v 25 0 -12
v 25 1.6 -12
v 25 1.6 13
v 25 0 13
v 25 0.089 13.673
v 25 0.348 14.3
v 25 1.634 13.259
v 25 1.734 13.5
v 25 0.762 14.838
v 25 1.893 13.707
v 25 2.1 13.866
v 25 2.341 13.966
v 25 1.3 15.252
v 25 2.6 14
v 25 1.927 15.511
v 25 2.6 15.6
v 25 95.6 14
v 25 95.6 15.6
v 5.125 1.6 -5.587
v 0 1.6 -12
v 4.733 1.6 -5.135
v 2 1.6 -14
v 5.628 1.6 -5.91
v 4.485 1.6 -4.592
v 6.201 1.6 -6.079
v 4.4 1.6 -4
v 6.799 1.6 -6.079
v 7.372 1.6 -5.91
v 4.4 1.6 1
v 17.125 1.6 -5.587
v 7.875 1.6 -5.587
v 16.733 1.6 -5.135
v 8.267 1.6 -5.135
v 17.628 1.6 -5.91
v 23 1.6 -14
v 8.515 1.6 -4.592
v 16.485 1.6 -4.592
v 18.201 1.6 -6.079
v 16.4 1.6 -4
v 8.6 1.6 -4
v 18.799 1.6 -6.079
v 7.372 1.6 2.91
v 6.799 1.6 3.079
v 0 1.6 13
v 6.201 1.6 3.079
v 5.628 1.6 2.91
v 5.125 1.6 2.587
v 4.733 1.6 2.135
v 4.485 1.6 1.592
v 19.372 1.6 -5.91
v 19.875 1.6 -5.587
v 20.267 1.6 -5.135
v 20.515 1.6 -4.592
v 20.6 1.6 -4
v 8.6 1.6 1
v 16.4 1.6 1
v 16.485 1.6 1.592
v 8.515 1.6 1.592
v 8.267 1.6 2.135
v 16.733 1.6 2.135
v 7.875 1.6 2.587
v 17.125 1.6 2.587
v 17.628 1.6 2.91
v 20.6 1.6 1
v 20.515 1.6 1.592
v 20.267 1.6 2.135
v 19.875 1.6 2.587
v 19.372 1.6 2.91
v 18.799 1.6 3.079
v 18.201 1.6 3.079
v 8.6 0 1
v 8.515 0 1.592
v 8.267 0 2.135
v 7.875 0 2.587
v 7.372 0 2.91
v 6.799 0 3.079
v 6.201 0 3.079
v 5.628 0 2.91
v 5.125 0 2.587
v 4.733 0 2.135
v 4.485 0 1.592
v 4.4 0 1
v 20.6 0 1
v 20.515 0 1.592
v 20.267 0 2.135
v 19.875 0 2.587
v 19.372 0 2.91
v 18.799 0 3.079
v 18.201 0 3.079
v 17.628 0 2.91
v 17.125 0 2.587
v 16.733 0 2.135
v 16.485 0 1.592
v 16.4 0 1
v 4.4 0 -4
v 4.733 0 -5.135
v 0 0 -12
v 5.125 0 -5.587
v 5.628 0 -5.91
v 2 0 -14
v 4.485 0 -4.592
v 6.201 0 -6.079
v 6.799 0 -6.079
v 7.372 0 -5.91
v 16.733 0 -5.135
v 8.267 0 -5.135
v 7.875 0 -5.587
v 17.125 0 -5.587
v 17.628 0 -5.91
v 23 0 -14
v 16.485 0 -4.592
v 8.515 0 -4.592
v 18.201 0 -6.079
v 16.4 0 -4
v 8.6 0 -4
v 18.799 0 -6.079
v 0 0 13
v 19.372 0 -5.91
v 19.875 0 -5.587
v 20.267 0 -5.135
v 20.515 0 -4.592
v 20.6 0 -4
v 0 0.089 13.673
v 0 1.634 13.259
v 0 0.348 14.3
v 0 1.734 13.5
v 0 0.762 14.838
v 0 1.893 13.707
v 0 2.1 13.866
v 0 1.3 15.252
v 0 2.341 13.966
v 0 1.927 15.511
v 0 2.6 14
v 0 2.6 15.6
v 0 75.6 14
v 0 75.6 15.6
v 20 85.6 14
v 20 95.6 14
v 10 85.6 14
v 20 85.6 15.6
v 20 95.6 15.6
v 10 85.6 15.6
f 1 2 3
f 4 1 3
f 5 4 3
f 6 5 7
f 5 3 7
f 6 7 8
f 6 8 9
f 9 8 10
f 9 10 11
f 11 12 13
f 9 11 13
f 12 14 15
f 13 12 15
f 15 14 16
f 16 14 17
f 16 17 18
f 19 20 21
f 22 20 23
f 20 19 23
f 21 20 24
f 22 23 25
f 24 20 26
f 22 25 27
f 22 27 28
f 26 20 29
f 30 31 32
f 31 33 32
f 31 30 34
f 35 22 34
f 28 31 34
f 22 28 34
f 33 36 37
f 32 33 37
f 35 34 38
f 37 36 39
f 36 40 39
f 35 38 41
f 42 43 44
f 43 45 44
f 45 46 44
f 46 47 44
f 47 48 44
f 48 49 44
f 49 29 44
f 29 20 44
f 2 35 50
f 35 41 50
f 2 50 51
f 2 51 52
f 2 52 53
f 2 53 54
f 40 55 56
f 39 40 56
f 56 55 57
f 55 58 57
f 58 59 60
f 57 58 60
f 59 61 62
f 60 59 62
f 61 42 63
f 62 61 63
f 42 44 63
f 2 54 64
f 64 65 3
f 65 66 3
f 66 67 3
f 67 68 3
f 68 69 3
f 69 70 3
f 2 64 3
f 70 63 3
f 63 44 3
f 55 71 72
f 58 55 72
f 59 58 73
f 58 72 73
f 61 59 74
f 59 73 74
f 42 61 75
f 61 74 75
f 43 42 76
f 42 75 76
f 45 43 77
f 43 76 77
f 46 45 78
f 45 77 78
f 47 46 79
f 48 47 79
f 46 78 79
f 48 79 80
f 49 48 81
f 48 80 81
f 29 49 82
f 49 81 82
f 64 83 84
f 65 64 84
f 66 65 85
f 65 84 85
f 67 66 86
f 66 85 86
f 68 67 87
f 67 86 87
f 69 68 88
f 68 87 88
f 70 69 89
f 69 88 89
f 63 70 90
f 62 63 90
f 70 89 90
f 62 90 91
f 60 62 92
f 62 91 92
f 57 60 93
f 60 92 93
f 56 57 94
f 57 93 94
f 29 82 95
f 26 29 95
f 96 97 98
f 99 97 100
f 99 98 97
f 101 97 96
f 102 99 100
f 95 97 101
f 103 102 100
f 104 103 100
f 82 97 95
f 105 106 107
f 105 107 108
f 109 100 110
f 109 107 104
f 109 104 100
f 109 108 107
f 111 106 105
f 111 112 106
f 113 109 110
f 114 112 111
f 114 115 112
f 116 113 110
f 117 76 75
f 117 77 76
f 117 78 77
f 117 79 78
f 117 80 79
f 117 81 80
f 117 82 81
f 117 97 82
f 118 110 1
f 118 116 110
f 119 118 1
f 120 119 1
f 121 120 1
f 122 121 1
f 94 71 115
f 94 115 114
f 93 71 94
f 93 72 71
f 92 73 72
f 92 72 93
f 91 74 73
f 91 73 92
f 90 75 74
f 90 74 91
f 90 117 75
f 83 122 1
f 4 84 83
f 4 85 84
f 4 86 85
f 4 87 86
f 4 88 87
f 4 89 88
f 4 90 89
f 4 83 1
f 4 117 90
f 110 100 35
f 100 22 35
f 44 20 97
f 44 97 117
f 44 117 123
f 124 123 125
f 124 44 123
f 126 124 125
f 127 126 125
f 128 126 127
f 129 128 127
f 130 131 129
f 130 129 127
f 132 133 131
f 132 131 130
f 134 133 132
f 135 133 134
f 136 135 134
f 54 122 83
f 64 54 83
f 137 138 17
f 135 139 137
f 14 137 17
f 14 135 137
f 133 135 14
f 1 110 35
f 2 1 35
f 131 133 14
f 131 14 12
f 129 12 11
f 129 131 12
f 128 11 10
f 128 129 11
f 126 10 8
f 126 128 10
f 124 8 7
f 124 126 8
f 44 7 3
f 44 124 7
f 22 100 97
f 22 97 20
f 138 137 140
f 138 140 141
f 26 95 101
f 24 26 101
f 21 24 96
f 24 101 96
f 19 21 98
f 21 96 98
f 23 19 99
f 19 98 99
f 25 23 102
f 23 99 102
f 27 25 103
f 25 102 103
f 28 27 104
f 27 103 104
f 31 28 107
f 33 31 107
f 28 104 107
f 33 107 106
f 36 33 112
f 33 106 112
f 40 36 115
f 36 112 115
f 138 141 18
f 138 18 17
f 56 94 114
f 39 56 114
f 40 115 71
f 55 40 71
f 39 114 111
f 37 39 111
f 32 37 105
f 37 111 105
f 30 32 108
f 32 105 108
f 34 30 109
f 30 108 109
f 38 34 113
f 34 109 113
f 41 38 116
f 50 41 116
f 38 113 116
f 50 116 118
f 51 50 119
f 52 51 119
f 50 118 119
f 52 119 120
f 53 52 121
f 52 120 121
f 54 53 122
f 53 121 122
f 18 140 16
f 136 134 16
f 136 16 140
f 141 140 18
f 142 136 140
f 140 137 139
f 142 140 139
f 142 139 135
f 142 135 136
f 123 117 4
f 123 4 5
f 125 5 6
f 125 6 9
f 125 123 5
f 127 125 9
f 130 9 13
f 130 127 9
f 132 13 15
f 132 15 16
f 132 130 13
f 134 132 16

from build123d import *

# Parameters (mm, degrees)
SKETCH_1_W                       = 25
SKETCH_1_H                       = 1.6
SM_BASE_FLANGE_1_DEPTH           = 14
CUT_EXTRUDE_2_REACH              = 30.698
SM_EDGE_FLANGE_1_STRIP_W         = 8.4
SM_EDGE_FLANGE_1_STRIP_H         = 1.6
SM_EDGE_FLANGE_1_STRIP_CUT_DEPTH = 25
SM_EDGE_FLANGE_1_DEPTH           = 25
CUT_EXTRUDE_1_REACH              = 104.705
SKETCH_10_W                      = 20
SKETCH_10_H                      = 10
CHAMFER_1_SIZE                   = 10
CHAMFER_2_SIZE                   = 2


# Sheet-metal steps are written as plain solids
with BuildPart() as part:
    # Sketch 1 → 基材-凸緣1 (new, symmetric)
    with BuildSketch(Plane.XY):
        with Locations((12.5, 0.8)):
            Rectangle(SKETCH_1_W, SKETCH_1_H)
    extrude(amount=SM_BASE_FLANGE_1_DEPTH, both=True)

    # 草圖11 → 除料-伸長2 (cut, up to next)
    with BuildSketch(Plane.XZ, mode=Mode.PRIVATE) as cut_extrude_2_sk1:
        with BuildLine():
            Line((16.4, 1), (16.4, -4))
            ThreePointArc((16.4, -4), (18.5, -6.1), (20.6, -4))
            Line((20.6, -4), (20.6, 1))
            ThreePointArc((20.6, 1), (18.5, 3.1), (16.4, 1))
        make_face()
    cut_extrude_2_tool1 = extrude(cut_extrude_2_sk1.sketch, amount=-CUT_EXTRUDE_2_REACH, mode=Mode.PRIVATE) & part.part
    # 草圖11 → 除料-伸長2 (cut, up to next)
    with BuildSketch(Plane.XZ, mode=Mode.PRIVATE) as cut_extrude_2_sk2:
        with BuildLine():
            Line((4.4, 1), (4.4, -4))
            ThreePointArc((4.4, -4), (6.5, -6.1), (8.6, -4))
            Line((8.6, -4), (8.6, 1))
            ThreePointArc((8.6, 1), (6.5, 3.1), (4.4, 1))
        make_face()
    cut_extrude_2_tool2 = extrude(cut_extrude_2_sk2.sketch, amount=-CUT_EXTRUDE_2_REACH, mode=Mode.PRIVATE) & part.part
    add(cut_extrude_2_tool1.solids().sort_by_distance((18.5, 0, -1.5))[0], mode=Mode.SUBTRACT)
    add(cut_extrude_2_tool2.solids().sort_by_distance((6.5, 0, -1.5))[0], mode=Mode.SUBTRACT)

    # 邊線-凸緣1 strip (across the edge) → 邊線-凸緣1 strip cut (cut)
    with BuildSketch(Plane(origin=(0, 1.6, 14), x_dir=(0, 0, -1), z_dir=(1, 0, 0))):
        with Locations((-3.2, -0.8)):
            Rectangle(SM_EDGE_FLANGE_1_STRIP_W, SM_EDGE_FLANGE_1_STRIP_H)
    extrude(amount=SM_EDGE_FLANGE_1_STRIP_CUT_DEPTH, mode=Mode.SUBTRACT)

    # 邊線-凸緣1 section (across the edge) → 邊線-凸緣1 (add)
    with BuildSketch(Plane(origin=(0, 1.6, 14), x_dir=(0, 0, -1), z_dir=(1, 0, 0))):
        with BuildLine():
            Line((-1.6, 1), (-1.6, 94))
            Line((-1.6, 94), (0, 94))
            Line((0, 94), (0, 1))
            ThreePointArc((0, 1), (0.292893219, 0.292893219), (1, 0))
            Line((1, 0), (1, -1.6))
            ThreePointArc((1, -1.6), (-0.838477631, -0.838477631), (-1.6, 1))
        make_face()
    extrude(amount=SM_EDGE_FLANGE_1_DEPTH)

    # 草圖10 → 除料-伸長1 (cut, up to next)
    with BuildSketch(Plane(origin=(0, 0, 14), x_dir=(-1, 0, 0), z_dir=(0, 0, -1)), mode=Mode.PRIVATE) as cut_extrude_1_sk1:
        with Locations((-10, 90.6)):
            Rectangle(SKETCH_10_W, SKETCH_10_H)
    cut_extrude_1_tool1 = extrude(cut_extrude_1_sk1.sketch, amount=-CUT_EXTRUDE_1_REACH, mode=Mode.PRIVATE) & part.part
    add(cut_extrude_1_tool1.solids().sort_by_distance((10, 90.6, 14))[0], mode=Mode.SUBTRACT)

    # 導角1
    chamfer_1_edges = [part.edges().sort_by_distance(p)[0] for p in [
        (0, 85.6, 14.8),
    ]]
    chamfer(chamfer_1_edges, length=CHAMFER_1_SIZE)

    # 導角2
    chamfer_2_edges = [part.edges().sort_by_distance(p)[0] for p in [
        (25, 0.8, -14),
        (0, 0.8, -14),
    ]]
    chamfer(chamfer_2_edges, length=CHAMFER_2_SIZE)


solid = part.part
